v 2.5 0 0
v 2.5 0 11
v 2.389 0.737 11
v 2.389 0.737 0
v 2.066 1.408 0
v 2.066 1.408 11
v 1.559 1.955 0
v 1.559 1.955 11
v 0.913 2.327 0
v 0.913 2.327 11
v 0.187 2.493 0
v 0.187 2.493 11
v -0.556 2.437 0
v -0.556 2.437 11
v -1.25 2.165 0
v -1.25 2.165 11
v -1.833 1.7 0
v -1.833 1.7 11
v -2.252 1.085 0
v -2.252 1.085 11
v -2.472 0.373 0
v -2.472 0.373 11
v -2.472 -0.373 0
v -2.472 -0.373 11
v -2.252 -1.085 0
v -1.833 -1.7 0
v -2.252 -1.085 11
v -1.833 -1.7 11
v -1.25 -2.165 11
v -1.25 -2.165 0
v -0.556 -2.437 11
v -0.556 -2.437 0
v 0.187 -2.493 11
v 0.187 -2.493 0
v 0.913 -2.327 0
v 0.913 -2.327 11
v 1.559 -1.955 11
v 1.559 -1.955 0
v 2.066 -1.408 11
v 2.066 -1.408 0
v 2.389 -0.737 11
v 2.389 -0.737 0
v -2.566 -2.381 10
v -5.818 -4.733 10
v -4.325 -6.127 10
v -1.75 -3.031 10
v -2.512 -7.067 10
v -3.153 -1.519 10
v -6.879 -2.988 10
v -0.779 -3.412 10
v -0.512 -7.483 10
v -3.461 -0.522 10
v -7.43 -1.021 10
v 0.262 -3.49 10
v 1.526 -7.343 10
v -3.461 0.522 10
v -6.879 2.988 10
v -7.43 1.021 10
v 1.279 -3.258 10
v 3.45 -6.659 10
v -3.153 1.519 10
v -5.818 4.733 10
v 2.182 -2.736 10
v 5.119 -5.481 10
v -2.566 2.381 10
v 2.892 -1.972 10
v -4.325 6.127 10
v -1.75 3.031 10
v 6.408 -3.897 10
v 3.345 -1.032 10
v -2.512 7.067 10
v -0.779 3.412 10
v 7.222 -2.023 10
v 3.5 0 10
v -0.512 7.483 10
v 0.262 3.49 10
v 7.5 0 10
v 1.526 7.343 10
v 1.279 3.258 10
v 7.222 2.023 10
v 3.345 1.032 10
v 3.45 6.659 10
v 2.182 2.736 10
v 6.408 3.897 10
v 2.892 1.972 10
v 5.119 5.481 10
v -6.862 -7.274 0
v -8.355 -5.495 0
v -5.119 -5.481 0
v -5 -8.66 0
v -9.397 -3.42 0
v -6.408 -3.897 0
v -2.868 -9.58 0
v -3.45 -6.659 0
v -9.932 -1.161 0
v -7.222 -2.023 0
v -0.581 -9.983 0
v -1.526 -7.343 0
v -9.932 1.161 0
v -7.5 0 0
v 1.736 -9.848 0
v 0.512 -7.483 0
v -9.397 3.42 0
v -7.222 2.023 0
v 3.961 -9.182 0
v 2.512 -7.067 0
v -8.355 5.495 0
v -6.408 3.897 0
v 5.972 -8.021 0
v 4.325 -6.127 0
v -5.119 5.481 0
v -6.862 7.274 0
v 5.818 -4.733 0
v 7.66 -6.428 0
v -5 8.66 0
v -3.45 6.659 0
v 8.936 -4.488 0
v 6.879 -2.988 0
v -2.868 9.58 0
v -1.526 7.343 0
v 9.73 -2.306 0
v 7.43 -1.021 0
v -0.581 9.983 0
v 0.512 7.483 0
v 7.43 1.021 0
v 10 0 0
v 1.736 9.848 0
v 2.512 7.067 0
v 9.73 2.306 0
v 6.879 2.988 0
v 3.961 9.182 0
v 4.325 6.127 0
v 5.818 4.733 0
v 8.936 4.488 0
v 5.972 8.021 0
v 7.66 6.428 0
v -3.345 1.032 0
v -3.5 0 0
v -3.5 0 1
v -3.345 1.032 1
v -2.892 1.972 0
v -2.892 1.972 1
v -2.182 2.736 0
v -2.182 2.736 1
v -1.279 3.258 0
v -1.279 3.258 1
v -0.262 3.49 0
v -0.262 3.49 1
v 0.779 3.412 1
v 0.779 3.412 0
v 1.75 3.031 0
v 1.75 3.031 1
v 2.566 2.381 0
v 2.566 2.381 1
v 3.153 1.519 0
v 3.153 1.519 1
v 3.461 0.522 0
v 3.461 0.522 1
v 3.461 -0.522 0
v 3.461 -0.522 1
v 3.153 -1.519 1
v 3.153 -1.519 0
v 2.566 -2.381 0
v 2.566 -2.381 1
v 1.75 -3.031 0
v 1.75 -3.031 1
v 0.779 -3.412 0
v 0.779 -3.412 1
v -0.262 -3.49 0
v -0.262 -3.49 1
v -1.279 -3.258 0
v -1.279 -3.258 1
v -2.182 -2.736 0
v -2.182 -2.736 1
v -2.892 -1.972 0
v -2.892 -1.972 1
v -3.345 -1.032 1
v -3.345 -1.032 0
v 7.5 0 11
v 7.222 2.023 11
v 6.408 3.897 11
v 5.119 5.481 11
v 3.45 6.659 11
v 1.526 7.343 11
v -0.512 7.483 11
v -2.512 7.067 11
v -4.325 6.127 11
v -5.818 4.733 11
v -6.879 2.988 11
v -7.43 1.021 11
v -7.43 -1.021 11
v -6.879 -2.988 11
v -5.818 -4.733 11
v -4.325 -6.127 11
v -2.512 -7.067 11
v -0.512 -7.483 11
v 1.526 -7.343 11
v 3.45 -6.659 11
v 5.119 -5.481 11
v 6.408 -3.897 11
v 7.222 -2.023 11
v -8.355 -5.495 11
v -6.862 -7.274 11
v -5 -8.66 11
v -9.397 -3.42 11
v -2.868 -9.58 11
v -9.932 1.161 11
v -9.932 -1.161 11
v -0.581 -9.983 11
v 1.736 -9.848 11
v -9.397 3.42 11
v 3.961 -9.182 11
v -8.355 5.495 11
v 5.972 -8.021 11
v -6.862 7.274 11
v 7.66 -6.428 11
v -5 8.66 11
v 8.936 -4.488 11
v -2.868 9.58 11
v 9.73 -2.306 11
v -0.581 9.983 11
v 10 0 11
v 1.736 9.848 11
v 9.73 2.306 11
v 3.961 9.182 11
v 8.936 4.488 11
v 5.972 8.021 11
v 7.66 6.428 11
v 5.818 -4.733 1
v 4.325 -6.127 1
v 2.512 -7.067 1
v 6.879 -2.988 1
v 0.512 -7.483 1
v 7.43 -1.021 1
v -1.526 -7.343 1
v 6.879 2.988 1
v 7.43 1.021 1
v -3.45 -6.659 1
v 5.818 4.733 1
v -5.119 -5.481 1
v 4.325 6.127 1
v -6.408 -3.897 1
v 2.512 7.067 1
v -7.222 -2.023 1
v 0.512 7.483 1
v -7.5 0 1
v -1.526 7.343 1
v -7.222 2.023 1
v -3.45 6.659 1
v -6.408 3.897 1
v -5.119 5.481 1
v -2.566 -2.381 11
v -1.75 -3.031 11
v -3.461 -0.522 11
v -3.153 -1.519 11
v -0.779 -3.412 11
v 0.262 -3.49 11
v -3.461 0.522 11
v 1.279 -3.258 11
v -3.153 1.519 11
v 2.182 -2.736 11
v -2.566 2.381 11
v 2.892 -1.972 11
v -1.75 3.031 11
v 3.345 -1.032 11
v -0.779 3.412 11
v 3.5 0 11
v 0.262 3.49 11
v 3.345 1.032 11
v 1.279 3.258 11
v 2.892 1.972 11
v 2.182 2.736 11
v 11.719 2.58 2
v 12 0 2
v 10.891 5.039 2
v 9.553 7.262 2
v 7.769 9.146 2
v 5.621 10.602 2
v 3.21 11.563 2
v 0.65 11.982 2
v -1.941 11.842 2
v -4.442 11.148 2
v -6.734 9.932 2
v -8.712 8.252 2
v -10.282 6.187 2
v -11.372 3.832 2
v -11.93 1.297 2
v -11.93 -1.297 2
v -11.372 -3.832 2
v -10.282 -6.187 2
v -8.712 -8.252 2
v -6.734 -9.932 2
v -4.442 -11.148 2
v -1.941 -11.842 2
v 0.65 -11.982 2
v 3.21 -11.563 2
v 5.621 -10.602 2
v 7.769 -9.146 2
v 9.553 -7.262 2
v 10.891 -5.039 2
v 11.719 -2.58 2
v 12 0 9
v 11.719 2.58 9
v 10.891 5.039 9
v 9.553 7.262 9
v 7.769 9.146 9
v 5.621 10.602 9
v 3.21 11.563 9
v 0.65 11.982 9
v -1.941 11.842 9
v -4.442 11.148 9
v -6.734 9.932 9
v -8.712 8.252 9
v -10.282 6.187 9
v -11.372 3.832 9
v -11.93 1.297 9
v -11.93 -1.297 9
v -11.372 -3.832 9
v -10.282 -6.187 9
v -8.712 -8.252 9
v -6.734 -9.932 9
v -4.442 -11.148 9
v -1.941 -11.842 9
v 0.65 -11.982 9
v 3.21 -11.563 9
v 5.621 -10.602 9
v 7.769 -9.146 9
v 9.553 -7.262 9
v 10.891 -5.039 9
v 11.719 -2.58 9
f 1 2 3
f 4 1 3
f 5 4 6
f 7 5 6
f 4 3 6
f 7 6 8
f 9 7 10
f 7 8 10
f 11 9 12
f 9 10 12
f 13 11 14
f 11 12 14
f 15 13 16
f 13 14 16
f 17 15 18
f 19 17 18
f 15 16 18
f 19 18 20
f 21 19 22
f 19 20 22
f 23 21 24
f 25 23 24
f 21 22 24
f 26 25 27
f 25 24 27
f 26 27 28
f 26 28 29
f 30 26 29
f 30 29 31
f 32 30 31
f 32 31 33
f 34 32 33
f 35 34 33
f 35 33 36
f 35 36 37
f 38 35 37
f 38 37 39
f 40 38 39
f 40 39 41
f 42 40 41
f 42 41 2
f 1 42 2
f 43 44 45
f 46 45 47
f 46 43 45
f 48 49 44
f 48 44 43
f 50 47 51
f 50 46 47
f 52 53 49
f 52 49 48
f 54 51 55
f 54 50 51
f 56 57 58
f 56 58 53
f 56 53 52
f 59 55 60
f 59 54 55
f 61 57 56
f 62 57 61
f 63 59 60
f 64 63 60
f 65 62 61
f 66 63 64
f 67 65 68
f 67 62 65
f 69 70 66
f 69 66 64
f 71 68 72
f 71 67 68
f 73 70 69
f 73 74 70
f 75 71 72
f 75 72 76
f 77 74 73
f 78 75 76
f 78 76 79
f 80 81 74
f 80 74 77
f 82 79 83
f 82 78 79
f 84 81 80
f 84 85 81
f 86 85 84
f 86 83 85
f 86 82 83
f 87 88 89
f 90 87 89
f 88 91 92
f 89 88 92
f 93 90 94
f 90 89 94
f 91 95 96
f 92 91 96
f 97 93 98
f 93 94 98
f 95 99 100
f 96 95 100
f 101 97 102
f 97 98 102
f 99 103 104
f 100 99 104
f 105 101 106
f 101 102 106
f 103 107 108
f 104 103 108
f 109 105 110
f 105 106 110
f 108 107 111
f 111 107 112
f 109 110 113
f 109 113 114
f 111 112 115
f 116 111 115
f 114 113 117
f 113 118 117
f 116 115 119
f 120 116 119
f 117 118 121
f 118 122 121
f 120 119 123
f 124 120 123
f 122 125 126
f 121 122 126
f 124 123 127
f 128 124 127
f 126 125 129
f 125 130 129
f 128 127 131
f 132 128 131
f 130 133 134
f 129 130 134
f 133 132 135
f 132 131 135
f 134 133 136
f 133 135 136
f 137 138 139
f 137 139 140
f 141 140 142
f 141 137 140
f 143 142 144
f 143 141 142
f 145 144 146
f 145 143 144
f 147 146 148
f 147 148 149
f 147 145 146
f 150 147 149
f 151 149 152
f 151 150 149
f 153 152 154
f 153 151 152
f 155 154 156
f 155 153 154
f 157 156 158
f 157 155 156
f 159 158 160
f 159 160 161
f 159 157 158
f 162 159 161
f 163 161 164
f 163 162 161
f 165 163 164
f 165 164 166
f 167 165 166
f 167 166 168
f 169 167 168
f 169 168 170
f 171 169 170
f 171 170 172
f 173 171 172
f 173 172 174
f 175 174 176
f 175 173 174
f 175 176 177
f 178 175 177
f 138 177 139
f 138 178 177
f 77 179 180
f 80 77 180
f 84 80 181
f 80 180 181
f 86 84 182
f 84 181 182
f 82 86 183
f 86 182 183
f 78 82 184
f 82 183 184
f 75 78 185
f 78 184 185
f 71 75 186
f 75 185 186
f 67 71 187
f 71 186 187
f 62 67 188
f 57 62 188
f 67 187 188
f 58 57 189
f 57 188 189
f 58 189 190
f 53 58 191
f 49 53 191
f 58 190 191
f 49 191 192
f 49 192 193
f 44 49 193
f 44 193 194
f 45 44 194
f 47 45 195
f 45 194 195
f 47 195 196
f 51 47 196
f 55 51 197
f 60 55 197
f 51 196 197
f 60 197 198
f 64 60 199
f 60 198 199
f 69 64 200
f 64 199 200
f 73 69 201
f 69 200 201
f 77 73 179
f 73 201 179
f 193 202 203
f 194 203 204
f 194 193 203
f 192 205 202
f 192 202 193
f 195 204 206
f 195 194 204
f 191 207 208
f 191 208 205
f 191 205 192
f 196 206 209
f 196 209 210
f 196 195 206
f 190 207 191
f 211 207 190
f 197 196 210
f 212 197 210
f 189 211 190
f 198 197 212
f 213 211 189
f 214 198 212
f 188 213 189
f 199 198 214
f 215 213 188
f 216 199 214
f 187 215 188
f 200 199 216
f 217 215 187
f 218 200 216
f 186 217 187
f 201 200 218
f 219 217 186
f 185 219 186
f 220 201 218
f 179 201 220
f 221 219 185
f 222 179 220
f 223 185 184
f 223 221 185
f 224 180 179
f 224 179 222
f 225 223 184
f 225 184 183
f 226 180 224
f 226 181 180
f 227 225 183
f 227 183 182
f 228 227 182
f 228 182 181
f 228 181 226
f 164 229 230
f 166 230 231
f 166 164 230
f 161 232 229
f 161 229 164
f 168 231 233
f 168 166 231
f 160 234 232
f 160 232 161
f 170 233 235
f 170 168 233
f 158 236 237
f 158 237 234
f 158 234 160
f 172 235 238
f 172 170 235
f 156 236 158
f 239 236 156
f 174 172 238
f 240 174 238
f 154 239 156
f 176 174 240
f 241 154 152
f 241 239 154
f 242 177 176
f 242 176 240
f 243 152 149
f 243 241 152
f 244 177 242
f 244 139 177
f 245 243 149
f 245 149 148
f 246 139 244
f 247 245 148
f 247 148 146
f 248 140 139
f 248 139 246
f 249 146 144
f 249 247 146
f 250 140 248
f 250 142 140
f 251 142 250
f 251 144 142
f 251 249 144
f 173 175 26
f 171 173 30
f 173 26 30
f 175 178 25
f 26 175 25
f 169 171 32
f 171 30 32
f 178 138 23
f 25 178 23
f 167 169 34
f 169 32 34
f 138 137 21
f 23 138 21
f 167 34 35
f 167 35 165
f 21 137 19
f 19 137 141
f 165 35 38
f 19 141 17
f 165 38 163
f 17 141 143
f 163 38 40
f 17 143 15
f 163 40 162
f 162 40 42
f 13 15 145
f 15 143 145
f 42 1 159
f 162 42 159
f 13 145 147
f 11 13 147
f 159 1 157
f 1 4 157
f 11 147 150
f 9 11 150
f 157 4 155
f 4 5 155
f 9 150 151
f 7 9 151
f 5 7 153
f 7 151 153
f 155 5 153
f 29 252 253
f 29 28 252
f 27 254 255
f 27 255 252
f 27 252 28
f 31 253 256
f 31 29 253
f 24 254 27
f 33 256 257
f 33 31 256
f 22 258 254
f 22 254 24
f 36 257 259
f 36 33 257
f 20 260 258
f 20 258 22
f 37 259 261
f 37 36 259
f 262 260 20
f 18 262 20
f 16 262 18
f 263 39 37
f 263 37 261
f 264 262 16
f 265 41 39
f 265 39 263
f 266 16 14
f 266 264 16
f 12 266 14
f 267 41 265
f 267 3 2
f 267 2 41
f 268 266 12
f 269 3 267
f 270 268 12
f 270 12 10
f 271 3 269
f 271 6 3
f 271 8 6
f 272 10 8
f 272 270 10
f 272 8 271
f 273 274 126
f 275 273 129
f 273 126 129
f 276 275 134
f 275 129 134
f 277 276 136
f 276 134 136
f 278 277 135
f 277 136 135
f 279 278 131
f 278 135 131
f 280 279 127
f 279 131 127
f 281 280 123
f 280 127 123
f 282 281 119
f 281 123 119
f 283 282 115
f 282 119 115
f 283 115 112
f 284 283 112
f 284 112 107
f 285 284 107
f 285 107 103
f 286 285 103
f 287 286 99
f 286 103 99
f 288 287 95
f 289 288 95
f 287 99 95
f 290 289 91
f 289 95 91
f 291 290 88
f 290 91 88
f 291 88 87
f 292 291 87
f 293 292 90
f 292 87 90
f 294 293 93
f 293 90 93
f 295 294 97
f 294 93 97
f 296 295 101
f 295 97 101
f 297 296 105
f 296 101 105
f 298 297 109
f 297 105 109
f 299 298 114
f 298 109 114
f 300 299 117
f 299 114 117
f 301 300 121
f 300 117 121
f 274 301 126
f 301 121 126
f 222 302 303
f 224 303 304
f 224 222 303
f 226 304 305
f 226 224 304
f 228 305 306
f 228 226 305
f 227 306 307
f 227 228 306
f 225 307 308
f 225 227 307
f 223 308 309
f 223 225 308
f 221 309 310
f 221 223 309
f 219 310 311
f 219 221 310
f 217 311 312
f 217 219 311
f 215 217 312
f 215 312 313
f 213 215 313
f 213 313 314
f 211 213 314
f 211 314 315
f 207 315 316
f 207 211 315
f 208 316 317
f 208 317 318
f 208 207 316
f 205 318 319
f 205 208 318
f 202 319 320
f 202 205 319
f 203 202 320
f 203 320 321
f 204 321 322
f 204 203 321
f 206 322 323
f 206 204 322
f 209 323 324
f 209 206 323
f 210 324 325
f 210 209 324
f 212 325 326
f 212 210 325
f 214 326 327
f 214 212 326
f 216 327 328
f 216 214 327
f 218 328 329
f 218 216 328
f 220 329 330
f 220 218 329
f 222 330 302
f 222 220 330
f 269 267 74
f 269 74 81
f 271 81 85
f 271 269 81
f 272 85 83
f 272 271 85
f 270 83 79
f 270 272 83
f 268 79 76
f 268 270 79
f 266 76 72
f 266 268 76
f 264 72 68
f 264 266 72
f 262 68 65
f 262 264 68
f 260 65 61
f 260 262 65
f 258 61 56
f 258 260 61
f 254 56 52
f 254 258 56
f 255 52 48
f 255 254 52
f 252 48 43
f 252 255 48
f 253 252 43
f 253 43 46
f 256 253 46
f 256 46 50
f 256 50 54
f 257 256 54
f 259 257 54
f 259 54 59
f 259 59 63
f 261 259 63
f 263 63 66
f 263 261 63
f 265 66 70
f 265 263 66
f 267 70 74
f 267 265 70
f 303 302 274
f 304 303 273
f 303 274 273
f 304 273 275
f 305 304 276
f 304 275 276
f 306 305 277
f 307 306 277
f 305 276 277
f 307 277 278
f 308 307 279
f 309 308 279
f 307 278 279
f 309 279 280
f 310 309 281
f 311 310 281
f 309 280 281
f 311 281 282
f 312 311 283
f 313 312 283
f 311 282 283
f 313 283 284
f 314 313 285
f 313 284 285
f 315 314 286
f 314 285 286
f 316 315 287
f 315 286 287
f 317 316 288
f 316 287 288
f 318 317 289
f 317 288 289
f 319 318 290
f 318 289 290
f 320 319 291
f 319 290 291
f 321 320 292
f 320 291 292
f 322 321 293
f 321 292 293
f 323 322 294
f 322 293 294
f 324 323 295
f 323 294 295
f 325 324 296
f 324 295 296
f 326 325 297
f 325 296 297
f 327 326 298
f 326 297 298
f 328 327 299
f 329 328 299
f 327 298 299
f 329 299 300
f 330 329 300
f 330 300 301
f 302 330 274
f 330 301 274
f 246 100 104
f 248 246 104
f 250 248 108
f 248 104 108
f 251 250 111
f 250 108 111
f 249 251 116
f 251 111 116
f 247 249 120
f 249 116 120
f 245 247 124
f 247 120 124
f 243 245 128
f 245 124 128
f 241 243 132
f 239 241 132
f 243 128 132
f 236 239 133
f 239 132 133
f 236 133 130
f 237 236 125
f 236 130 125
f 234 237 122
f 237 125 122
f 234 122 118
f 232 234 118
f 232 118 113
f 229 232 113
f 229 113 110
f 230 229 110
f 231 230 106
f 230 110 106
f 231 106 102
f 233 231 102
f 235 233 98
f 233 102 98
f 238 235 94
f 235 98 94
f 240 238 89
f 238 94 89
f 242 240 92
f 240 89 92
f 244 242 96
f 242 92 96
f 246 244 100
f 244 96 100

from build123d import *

# Parameters (mm, degrees)
SKETCH1_R           = 12
BOSS_EXTRUDE1_DEPTH = 11
CHAMFER1_SIZE       = 2
SKETCH2_R           = 2.5
CUT_EXTRUDE1_DEPTH  = 12
SKETCH3_R           = 7.5
SKETCH3_R_2         = 3.5
CUT_EXTRUDE2_DEPTH  = 1
SKETCH4_R           = 7.5
SKETCH4_R_2         = 3.5
CUT_EXTRUDE3_DEPTH  = 1


with BuildPart() as part:
    # Sketch1 → Boss-Extrude1 (new body)
    with BuildSketch(Plane.XY):
        Circle(SKETCH1_R)
    extrude(amount=BOSS_EXTRUDE1_DEPTH)

    # Chamfer1
    chamfer1_edges = [part.edges().sort_by_distance(p)[0] for p in [
        (-12, 0, 0),
        (-12, 0, 11),
    ]]
    chamfer(chamfer1_edges, length=CHAMFER1_SIZE)

    # Sketch2 → Cut-Extrude1 (cut, through all)
    with BuildSketch(Plane.XY.offset(11)):
        Circle(SKETCH2_R)
    extrude(amount=-CUT_EXTRUDE1_DEPTH, mode=Mode.SUBTRACT)

    # Sketch3 → Cut-Extrude2 (cut)
    with BuildSketch(Plane.XY.offset(11)):
        Circle(SKETCH3_R)
        Circle(SKETCH3_R_2, mode=Mode.SUBTRACT)
    extrude(amount=-CUT_EXTRUDE2_DEPTH, mode=Mode.SUBTRACT)

    # Sketch4 → Cut-Extrude3 (cut)
    with BuildSketch(Plane(origin=(0, 0, 0), x_dir=(-1, 0, 0), z_dir=(0, 0, -1))):
        Circle(SKETCH4_R)
        Circle(SKETCH4_R_2, mode=Mode.SUBTRACT)
    extrude(amount=-CUT_EXTRUDE3_DEPTH, mode=Mode.SUBTRACT)


solid = part.part
